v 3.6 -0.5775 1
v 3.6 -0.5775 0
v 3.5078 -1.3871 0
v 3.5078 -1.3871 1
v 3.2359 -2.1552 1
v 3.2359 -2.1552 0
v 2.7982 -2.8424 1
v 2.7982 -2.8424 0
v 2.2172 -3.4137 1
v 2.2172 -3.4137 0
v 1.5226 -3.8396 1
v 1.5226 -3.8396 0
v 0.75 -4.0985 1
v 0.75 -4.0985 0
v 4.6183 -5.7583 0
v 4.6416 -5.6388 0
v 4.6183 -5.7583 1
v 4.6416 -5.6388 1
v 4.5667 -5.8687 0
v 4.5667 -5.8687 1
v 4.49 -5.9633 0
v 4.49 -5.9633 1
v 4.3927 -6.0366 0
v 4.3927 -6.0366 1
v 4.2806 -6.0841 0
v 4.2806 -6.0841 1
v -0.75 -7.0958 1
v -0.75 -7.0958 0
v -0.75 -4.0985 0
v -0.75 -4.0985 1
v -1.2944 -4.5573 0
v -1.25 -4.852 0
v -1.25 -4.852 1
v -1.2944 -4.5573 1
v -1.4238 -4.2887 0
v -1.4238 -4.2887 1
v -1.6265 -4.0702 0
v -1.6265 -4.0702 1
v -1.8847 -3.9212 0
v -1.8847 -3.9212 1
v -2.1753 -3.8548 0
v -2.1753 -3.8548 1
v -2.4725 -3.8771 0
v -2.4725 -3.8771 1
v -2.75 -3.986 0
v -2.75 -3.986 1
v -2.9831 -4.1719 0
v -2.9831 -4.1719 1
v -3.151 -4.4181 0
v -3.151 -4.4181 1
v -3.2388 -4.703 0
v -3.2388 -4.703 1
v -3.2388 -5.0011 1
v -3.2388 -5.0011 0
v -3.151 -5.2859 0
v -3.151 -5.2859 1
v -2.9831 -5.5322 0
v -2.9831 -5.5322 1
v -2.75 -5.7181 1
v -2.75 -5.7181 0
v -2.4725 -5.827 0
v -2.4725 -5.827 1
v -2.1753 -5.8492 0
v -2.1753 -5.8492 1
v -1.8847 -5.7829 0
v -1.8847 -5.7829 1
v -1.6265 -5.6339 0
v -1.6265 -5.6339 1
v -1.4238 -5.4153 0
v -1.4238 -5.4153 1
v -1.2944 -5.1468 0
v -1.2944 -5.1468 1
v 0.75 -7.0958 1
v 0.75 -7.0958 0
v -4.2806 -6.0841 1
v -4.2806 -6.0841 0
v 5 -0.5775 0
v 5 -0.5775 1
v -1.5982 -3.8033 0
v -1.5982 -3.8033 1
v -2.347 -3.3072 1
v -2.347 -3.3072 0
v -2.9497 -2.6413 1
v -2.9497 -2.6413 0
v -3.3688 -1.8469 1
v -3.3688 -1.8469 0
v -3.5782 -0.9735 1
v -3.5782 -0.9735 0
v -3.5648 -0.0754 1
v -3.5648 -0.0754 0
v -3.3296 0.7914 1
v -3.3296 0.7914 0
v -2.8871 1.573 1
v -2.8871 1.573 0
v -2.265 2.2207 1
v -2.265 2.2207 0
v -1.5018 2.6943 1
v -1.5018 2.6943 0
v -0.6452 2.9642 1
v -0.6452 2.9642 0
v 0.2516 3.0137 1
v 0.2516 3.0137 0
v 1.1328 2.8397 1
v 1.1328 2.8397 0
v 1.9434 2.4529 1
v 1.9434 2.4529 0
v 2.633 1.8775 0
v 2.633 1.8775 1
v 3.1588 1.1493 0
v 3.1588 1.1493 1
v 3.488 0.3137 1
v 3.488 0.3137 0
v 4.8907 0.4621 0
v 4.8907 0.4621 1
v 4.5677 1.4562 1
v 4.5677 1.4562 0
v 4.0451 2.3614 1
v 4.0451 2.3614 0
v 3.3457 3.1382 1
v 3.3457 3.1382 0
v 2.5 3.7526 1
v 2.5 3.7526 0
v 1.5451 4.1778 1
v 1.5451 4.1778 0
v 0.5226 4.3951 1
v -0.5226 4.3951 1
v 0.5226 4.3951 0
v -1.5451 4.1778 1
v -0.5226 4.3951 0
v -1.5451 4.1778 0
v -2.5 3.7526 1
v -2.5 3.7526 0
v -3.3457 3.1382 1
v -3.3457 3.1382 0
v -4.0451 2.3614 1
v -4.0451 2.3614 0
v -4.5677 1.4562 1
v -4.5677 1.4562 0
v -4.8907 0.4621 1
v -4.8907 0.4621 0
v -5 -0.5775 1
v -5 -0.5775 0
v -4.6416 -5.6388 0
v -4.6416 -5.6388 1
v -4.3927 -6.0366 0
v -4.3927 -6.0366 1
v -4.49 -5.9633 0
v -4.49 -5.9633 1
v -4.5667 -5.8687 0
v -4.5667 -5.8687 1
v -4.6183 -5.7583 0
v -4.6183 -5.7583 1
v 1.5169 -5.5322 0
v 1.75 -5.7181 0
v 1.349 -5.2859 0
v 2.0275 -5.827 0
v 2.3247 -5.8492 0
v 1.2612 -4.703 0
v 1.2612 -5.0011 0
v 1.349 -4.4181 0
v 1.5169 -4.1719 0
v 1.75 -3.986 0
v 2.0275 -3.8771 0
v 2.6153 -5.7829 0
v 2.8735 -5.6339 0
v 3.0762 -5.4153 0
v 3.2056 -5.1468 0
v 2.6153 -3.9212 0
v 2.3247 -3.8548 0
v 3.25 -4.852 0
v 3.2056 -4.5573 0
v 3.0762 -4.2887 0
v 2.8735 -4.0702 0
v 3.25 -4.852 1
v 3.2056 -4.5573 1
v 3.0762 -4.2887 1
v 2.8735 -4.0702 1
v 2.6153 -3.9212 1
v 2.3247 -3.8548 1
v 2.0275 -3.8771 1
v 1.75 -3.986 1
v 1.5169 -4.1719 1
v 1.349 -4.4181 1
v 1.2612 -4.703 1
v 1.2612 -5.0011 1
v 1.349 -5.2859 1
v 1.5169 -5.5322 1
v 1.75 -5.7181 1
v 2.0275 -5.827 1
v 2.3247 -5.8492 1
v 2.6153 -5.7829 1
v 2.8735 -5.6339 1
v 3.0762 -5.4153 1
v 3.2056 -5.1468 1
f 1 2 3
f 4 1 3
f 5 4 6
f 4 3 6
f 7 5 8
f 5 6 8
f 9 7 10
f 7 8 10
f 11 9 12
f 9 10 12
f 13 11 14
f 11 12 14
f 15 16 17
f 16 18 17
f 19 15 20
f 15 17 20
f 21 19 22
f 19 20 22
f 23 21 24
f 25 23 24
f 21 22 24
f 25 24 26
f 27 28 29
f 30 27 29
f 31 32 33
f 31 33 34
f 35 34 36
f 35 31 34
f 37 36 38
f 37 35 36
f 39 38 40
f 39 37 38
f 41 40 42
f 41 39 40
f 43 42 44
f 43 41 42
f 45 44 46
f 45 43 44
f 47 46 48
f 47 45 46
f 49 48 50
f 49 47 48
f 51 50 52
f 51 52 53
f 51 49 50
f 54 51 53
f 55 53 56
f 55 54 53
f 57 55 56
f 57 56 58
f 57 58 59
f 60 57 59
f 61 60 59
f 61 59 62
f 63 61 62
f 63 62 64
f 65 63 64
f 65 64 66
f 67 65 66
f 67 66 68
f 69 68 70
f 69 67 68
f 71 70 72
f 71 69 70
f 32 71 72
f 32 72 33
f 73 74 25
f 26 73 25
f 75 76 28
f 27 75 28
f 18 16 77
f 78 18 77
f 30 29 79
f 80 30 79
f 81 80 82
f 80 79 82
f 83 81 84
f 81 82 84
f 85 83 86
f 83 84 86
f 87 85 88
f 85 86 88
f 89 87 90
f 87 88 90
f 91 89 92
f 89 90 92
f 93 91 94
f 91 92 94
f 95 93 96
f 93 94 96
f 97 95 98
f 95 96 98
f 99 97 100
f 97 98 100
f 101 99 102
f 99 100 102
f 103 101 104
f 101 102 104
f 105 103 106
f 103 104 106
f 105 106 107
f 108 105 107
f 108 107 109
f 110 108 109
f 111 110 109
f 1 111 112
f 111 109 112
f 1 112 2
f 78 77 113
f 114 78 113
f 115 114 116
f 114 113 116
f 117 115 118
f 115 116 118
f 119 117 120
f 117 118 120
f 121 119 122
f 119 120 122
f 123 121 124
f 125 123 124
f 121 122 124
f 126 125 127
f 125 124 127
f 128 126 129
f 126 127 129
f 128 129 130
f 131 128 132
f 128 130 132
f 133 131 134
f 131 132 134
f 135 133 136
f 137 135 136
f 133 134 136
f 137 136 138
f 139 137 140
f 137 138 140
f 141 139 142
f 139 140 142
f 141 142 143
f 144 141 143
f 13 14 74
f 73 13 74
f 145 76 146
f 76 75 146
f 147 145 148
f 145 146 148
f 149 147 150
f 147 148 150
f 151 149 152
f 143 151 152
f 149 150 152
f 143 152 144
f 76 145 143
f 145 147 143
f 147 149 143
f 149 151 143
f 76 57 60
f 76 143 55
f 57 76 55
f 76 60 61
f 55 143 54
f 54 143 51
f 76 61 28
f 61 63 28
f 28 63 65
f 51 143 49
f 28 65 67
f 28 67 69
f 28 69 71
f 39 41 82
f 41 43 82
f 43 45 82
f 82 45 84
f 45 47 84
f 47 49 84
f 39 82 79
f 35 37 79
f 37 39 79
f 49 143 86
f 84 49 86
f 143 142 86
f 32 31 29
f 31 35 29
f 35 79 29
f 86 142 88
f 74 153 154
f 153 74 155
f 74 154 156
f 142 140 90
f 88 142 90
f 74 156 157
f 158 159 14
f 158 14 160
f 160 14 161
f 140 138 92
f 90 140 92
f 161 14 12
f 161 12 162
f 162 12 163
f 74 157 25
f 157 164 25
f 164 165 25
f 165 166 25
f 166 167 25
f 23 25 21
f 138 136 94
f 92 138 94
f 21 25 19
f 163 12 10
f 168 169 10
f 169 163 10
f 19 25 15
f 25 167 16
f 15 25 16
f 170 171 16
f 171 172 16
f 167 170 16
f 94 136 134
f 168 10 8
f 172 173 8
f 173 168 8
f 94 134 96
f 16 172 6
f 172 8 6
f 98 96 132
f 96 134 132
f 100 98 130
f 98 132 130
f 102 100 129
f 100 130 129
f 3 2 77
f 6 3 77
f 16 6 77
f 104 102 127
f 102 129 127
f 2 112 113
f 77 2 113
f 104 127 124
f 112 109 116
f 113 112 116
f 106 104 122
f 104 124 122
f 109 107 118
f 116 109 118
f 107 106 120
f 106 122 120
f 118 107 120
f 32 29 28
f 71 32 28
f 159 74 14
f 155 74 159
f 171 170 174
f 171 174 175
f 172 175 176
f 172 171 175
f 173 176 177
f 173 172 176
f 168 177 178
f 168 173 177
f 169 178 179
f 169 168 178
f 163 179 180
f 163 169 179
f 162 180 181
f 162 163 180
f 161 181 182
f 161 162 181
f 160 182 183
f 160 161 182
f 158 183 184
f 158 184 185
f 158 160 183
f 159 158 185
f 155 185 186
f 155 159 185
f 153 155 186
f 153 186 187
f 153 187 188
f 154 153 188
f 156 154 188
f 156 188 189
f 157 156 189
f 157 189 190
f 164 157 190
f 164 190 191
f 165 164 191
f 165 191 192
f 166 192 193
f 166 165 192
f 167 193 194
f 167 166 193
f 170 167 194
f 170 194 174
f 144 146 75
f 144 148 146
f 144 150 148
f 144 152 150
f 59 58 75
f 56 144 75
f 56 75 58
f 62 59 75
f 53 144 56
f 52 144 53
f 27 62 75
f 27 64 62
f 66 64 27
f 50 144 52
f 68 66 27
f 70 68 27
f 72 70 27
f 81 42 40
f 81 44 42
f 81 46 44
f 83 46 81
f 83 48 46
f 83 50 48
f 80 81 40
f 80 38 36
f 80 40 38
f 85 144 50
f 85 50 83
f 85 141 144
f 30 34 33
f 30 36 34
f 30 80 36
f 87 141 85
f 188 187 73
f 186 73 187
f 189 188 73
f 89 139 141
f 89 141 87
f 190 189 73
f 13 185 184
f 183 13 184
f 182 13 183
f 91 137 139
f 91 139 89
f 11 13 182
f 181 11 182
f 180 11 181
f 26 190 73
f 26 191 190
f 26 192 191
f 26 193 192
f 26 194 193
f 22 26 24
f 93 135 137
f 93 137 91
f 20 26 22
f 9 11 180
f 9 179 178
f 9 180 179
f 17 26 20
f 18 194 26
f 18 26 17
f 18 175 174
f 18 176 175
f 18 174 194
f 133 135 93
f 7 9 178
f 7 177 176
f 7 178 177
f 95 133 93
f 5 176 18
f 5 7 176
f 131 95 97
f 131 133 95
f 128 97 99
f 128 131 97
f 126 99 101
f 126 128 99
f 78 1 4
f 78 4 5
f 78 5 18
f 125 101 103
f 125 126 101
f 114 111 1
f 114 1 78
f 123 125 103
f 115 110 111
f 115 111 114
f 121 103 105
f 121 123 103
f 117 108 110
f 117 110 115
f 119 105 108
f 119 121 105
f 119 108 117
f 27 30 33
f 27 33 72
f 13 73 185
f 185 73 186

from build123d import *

# Parameters (mm, degrees)
SKETCH_1_R      = 1
EXTRUDE_1_DEPTH = 1
FILLET_1_R      = 0.5


with BuildPart() as part:
    # 草图1 → 凸台-拉伸1 (new body)
    with BuildSketch(Plane.XY):
        with BuildLine():
            Line((-0.75, -7.095841887), (-0.75, -6.711388546))
            Line((-0.75, -6.711388546), (-0.75, -5.520914569))
            Line((-0.75, -5.520914569), (-0.75, -4.098492964))
            ThreePointArc((-0.75, -4.098492964), (-2.264950331, 2.22072913), (3.6, -0.577484586))
            ThreePointArc((3.6, -0.577484586), (2.798213716, -2.842434917), (0.75, -4.098492964))
            Line((0.75, -4.098492964), (0.75, -5.520914569))
            Line((0.75, -5.520914569), (0.75, -6.711388546))
            Line((0.75, -6.711388546), (0.75, -7.095841887))
            Line((0.75, -7.095841887), (4.616918769, -5.987758242))
            Line((4.616918769, -5.987758242), (5, -0.577484586))
            ThreePointArc((5, -0.577484586), (0, 4.422515414), (-5, -0.577484586))
            Line((-5, -0.577484586), (-4.616918769, -5.987758242))
            Line((-4.616918769, -5.987758242), (-0.75, -7.095841887))
        make_face()
        with Locations((-2.25, -4.852026876)):
            Circle(SKETCH_1_R, mode=Mode.SUBTRACT)
        with Locations((2.25, -4.852026876)):
            Circle(SKETCH_1_R, mode=Mode.SUBTRACT)
    extrude(amount=EXTRUDE_1_DEPTH)

    # 圆角1
    fillet_1_edges = [part.edges().sort_by_distance(p)[0] for p in [
        (4.616918769, -5.987758242, 0.5),
        (-4.616918769, -5.987758242, 0.5),
    ]]
    fillet(fillet_1_edges, radius=FILLET_1_R)


solid = part.part
